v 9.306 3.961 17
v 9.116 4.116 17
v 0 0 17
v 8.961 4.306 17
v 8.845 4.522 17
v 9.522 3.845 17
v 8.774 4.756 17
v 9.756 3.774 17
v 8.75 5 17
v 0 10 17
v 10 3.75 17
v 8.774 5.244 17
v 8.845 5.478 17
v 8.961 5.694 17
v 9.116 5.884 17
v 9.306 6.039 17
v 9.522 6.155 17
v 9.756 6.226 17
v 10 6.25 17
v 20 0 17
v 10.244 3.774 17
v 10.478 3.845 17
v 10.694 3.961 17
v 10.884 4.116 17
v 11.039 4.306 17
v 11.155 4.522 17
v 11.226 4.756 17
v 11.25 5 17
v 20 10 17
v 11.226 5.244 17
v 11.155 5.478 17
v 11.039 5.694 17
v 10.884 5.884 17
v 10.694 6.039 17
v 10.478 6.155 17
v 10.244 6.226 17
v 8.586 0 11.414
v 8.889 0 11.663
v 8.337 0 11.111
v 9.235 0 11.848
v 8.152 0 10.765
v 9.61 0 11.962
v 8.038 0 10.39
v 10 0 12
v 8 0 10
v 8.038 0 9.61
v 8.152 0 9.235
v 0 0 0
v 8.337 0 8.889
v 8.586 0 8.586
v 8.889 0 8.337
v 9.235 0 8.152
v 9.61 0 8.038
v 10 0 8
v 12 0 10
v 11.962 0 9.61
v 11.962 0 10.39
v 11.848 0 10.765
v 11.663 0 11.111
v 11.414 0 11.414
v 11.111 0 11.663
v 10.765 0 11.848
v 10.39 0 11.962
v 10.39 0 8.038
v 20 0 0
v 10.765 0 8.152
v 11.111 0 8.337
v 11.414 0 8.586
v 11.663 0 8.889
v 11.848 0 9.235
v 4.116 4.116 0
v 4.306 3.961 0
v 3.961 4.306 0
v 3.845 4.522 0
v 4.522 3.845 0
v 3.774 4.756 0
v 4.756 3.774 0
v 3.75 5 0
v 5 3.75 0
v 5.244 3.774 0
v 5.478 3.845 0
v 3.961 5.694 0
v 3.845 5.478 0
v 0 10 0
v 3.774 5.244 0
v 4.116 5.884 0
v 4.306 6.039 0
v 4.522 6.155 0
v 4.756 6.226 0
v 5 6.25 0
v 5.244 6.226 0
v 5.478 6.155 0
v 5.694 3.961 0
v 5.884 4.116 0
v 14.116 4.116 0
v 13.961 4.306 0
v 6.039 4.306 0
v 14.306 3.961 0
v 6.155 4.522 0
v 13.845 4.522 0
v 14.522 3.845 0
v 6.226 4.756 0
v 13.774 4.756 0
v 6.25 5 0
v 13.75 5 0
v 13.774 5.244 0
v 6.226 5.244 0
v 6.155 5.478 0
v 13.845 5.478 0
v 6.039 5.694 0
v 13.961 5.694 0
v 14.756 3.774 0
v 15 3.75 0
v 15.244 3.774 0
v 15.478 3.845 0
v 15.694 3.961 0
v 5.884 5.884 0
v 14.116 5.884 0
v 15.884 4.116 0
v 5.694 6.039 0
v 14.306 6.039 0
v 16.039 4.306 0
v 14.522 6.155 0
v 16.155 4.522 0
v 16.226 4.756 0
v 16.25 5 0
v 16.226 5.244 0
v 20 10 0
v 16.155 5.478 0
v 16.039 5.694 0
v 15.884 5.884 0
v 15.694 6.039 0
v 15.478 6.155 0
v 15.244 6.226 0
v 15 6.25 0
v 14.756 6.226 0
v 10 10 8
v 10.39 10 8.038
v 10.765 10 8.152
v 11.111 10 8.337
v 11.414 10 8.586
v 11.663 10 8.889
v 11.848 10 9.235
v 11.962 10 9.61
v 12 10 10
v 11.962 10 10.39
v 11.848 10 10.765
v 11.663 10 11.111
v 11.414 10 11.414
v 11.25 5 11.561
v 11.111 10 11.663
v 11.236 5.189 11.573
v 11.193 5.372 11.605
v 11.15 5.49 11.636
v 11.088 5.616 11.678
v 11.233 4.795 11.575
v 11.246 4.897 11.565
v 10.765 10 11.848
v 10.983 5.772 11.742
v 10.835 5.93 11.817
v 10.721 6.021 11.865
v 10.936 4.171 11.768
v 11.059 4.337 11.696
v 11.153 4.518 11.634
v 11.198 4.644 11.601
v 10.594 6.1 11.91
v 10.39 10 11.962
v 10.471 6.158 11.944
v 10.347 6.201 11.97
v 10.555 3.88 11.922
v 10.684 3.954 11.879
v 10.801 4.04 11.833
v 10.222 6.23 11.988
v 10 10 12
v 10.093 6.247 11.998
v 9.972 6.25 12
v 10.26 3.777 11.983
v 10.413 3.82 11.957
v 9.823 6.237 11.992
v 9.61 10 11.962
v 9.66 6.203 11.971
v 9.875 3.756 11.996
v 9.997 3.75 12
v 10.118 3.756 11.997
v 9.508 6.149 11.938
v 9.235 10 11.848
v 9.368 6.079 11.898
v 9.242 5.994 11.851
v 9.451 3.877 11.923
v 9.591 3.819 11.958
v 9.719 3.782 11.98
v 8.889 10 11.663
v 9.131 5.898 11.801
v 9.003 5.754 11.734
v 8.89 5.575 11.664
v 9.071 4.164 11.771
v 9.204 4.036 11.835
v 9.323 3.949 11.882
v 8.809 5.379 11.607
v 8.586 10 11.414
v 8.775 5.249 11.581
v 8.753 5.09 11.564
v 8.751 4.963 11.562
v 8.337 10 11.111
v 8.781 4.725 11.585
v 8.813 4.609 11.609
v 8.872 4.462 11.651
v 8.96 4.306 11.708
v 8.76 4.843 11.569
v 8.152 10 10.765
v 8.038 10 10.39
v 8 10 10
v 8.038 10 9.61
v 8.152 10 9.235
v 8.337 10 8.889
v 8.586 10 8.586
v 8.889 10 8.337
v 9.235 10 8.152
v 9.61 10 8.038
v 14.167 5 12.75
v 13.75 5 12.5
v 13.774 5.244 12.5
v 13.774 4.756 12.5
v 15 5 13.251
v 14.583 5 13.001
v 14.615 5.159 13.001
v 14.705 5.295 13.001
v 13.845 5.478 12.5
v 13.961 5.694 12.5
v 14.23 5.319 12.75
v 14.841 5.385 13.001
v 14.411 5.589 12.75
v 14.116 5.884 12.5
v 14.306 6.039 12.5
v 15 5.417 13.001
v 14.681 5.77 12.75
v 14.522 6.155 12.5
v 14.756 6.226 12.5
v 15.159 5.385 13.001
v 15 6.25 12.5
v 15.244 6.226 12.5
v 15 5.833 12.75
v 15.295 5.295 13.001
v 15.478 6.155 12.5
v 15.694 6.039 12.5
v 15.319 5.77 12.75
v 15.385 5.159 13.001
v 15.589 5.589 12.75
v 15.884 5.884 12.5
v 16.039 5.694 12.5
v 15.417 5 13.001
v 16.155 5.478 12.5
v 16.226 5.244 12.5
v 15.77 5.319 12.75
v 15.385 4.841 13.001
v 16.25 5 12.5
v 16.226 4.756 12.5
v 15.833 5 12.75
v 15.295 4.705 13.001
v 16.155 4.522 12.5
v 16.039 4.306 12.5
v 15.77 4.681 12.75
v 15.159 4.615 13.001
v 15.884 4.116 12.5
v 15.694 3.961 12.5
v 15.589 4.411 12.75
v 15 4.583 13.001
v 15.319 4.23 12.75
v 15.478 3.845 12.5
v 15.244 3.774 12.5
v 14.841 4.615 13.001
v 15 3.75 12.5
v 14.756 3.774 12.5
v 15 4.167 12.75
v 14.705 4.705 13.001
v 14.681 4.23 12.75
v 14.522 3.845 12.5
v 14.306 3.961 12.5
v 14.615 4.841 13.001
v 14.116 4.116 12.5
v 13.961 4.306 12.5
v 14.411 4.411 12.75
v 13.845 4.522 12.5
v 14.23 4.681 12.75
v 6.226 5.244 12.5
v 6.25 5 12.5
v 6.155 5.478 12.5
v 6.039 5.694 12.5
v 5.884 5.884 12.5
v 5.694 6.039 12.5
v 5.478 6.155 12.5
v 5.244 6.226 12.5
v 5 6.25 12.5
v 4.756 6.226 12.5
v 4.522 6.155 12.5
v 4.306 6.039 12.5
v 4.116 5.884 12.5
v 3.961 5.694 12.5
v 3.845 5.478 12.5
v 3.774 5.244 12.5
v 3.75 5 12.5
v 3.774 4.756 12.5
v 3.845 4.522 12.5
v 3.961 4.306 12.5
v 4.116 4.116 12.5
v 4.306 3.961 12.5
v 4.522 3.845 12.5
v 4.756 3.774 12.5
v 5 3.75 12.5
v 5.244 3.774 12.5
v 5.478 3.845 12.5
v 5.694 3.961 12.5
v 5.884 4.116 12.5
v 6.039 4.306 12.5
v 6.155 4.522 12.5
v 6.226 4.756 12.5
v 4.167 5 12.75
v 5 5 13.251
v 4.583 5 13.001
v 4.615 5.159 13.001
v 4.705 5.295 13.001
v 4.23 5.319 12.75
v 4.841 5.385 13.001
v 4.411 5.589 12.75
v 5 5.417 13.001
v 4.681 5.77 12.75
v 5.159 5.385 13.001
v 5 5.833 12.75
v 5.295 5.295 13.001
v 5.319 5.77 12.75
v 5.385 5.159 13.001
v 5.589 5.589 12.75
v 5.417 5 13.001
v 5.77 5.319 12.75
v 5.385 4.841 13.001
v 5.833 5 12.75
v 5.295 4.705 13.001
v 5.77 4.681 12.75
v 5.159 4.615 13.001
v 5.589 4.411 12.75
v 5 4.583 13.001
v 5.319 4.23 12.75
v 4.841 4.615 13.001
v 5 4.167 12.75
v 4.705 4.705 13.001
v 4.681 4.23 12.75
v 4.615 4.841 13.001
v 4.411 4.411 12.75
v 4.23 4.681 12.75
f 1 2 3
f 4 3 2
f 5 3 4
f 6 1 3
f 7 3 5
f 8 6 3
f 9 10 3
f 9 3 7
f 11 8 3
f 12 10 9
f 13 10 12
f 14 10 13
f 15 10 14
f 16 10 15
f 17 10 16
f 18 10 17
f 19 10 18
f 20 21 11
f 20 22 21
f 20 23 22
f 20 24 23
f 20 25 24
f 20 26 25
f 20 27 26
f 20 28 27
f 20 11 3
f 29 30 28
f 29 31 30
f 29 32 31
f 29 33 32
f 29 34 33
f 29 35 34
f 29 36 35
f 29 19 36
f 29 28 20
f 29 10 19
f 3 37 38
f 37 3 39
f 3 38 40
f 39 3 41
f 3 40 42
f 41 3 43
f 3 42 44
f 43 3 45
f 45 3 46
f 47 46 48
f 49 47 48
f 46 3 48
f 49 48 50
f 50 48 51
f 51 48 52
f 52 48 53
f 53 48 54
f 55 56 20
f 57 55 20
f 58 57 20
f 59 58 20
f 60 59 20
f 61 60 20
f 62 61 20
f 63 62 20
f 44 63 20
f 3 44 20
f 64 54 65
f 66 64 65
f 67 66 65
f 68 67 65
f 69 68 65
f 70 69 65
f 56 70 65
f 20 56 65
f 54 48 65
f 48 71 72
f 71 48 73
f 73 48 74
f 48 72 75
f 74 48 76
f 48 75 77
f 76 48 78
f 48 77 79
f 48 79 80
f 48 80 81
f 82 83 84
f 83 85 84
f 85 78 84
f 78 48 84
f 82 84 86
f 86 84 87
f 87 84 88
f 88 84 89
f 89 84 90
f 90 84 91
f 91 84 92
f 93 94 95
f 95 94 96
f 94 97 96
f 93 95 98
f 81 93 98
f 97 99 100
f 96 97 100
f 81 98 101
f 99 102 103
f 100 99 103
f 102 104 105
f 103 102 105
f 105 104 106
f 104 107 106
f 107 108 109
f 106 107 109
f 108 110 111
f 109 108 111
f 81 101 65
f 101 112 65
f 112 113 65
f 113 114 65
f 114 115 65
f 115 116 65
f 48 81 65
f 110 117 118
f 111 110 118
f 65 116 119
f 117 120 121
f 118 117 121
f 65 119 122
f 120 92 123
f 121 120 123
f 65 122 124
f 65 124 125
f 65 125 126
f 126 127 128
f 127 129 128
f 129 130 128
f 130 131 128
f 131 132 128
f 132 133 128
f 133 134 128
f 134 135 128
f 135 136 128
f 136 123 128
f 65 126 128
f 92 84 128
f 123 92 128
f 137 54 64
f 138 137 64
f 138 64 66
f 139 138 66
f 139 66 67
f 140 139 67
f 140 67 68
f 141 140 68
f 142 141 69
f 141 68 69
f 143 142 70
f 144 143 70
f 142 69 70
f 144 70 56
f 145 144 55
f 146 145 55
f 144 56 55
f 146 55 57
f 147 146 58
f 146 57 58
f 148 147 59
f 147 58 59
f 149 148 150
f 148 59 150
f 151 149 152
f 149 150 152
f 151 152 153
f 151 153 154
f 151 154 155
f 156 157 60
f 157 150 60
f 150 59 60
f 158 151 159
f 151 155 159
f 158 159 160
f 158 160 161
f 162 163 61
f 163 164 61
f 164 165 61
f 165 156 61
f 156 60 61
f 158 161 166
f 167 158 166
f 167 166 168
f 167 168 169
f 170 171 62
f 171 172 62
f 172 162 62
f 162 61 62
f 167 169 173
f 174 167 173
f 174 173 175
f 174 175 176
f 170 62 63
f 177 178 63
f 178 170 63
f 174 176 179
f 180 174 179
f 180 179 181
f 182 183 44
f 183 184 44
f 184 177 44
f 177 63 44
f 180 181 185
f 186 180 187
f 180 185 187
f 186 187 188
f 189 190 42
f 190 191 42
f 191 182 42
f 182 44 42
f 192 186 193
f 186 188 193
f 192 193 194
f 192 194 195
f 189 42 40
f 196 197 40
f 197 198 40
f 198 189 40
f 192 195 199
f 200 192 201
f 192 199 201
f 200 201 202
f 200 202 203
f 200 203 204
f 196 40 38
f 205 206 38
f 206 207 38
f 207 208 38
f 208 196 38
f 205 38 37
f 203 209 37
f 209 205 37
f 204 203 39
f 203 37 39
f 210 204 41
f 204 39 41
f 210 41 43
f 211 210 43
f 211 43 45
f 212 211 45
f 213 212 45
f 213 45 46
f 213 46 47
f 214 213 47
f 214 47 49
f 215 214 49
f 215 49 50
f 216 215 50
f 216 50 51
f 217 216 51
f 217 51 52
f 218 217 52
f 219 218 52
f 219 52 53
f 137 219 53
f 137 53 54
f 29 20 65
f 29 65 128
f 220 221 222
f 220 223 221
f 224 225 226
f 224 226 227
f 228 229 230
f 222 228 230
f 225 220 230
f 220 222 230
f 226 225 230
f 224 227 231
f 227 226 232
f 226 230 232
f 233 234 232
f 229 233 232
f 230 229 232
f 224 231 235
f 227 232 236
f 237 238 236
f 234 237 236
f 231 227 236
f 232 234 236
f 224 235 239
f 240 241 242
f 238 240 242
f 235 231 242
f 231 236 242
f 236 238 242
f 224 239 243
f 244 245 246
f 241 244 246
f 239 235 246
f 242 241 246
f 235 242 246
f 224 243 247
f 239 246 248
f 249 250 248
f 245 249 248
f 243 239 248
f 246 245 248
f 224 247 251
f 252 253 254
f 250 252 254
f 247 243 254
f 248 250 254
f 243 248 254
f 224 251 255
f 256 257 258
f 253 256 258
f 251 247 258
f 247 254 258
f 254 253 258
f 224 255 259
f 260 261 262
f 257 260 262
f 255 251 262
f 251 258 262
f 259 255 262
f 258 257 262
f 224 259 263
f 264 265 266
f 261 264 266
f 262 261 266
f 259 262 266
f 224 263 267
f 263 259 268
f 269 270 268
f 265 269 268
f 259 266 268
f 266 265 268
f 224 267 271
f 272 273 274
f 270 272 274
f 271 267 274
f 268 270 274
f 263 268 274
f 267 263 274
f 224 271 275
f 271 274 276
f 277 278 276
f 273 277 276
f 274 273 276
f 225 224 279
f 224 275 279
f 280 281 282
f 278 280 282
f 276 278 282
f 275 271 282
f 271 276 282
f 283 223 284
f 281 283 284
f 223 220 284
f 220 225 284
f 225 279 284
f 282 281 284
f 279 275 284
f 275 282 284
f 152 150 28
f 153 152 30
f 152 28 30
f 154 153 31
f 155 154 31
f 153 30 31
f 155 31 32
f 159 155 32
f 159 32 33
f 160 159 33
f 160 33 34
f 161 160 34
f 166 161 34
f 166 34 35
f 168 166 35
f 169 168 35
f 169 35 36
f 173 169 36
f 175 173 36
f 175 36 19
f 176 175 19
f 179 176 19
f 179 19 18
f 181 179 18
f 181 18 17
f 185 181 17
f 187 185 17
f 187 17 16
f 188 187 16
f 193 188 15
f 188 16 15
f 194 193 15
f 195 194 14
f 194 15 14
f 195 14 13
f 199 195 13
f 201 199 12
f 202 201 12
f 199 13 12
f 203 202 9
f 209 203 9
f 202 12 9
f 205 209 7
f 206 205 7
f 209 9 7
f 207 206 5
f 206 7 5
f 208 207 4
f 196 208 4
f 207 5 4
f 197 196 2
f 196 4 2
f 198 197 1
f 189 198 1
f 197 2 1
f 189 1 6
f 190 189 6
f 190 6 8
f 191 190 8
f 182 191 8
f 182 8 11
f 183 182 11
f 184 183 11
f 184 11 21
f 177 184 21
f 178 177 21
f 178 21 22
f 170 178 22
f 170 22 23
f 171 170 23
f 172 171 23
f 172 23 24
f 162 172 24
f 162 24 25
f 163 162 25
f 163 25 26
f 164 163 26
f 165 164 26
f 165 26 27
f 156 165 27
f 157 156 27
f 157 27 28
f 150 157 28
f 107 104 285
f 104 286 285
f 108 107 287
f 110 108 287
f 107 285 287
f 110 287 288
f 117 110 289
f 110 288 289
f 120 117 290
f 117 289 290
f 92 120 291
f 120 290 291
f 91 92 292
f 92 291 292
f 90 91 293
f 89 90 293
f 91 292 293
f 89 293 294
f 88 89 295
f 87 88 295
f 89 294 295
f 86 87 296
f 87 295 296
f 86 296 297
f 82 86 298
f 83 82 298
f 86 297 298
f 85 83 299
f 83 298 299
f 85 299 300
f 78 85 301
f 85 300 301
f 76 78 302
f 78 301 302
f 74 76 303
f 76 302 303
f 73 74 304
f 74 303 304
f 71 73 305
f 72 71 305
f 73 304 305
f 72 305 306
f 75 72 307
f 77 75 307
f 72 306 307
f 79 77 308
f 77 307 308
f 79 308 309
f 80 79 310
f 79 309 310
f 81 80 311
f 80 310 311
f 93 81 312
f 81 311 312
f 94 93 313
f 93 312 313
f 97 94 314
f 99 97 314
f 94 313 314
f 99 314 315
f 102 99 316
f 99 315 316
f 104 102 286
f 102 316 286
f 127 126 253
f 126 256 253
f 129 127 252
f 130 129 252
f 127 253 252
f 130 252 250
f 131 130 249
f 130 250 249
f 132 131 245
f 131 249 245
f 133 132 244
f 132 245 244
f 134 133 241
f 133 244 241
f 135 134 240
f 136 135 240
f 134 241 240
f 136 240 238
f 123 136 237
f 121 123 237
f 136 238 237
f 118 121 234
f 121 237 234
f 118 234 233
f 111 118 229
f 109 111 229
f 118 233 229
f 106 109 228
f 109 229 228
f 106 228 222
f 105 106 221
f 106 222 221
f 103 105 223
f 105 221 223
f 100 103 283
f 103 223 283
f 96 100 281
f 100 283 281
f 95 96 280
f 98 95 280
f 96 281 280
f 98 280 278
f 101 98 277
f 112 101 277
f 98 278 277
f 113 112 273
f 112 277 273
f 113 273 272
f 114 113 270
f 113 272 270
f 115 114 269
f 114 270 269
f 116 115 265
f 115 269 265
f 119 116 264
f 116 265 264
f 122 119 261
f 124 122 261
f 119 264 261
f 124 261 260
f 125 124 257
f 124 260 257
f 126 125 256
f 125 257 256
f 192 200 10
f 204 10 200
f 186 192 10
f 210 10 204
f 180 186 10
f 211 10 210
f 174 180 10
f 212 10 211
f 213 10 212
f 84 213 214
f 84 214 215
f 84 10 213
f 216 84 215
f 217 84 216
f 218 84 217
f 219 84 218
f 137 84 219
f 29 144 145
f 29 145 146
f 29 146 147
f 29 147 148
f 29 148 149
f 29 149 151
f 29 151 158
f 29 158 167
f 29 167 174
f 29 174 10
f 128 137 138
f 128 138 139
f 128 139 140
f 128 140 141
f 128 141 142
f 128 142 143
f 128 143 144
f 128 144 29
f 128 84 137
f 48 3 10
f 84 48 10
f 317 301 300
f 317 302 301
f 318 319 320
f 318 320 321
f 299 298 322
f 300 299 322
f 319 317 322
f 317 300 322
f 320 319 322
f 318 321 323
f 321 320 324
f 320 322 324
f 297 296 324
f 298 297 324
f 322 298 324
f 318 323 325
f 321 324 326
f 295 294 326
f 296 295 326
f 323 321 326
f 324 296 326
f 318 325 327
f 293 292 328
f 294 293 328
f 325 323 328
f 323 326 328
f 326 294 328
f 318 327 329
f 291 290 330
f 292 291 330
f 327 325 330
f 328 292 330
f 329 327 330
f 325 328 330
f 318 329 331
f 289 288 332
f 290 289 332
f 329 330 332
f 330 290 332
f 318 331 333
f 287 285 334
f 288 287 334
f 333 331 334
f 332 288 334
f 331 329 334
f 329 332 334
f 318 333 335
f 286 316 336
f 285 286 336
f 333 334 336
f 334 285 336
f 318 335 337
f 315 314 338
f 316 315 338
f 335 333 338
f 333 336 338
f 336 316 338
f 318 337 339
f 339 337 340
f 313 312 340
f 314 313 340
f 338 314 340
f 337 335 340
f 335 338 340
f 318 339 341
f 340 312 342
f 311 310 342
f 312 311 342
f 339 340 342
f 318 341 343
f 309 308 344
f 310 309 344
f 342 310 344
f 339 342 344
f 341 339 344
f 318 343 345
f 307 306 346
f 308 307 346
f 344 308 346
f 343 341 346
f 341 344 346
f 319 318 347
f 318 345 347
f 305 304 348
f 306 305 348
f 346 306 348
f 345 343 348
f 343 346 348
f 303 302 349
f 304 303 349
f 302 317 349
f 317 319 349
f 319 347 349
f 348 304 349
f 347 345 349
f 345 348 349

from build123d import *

# Parameters (mm, degrees)
SKETCH_1_W          = 20
SKETCH_1_H          = 10
EXTRUDE_1_DEPTH     = 17
SKETCH_2_R          = 2
CUT_EXTRUDE_1_DEPTH = 29.08914381
M3X0_5_1_D          = 2.5
M3X0_5_1_DEPTH      = 12.5
M3X0_5_1_TIP        = 0.751075774
M3X0_5_2_REACH      = 30.089
M3X0_5_2_BORE_R     = 1.25


with BuildPart() as part:
    # ｽｹｯﾁ1 → ﾎﾞｽ - 押し出し1 (new body)
    with BuildSketch(Plane.XY):
        with Locations((10, 5)):
            Rectangle(SKETCH_1_W, SKETCH_1_H)
    extrude(amount=EXTRUDE_1_DEPTH)

    # ｽｹｯﾁ2 → ｶｯﾄ - 押し出し1 (cut, through all)
    with BuildSketch(Plane.XZ):
        with Locations(Location((10, 10, 0), (0, 0, 270))):
            Circle(SKETCH_2_R)
    extrude(amount=-CUT_EXTRUDE_1_DEPTH, mode=Mode.SUBTRACT)

    # M3x0.5 ねじ穴1
    with Locations(Plane(origin=(0, 0, 0), x_dir=(-1, 0, 0), z_dir=(0, 0, -1))):
        with Locations((-5, 5), (-15, 5)):
            Hole(M3X0_5_1_D / 2, depth=M3X0_5_1_DEPTH)
            with Locations((0, 0, -(M3X0_5_1_DEPTH + M3X0_5_1_TIP / 2))):  # 118° drill point
                Cone(0, M3X0_5_1_D / 2, M3X0_5_1_TIP, mode=Mode.SUBTRACT)

    # M3x0.5 ねじ穴2 bore → M3x0.5 ねじ穴2 (cut, up to next)
    with BuildSketch(Plane.XY.offset(17), mode=Mode.PRIVATE) as m3x0_5_2_sk1:
        with Locations((10, 5)):
            Circle(M3X0_5_2_BORE_R)
    m3x0_5_2_tool1 = extrude(m3x0_5_2_sk1.sketch, amount=-M3X0_5_2_REACH, mode=Mode.PRIVATE) & part.part
    add(m3x0_5_2_tool1.solids().sort_by_distance((10, 5, 17))[0], mode=Mode.SUBTRACT)


solid = part.part
